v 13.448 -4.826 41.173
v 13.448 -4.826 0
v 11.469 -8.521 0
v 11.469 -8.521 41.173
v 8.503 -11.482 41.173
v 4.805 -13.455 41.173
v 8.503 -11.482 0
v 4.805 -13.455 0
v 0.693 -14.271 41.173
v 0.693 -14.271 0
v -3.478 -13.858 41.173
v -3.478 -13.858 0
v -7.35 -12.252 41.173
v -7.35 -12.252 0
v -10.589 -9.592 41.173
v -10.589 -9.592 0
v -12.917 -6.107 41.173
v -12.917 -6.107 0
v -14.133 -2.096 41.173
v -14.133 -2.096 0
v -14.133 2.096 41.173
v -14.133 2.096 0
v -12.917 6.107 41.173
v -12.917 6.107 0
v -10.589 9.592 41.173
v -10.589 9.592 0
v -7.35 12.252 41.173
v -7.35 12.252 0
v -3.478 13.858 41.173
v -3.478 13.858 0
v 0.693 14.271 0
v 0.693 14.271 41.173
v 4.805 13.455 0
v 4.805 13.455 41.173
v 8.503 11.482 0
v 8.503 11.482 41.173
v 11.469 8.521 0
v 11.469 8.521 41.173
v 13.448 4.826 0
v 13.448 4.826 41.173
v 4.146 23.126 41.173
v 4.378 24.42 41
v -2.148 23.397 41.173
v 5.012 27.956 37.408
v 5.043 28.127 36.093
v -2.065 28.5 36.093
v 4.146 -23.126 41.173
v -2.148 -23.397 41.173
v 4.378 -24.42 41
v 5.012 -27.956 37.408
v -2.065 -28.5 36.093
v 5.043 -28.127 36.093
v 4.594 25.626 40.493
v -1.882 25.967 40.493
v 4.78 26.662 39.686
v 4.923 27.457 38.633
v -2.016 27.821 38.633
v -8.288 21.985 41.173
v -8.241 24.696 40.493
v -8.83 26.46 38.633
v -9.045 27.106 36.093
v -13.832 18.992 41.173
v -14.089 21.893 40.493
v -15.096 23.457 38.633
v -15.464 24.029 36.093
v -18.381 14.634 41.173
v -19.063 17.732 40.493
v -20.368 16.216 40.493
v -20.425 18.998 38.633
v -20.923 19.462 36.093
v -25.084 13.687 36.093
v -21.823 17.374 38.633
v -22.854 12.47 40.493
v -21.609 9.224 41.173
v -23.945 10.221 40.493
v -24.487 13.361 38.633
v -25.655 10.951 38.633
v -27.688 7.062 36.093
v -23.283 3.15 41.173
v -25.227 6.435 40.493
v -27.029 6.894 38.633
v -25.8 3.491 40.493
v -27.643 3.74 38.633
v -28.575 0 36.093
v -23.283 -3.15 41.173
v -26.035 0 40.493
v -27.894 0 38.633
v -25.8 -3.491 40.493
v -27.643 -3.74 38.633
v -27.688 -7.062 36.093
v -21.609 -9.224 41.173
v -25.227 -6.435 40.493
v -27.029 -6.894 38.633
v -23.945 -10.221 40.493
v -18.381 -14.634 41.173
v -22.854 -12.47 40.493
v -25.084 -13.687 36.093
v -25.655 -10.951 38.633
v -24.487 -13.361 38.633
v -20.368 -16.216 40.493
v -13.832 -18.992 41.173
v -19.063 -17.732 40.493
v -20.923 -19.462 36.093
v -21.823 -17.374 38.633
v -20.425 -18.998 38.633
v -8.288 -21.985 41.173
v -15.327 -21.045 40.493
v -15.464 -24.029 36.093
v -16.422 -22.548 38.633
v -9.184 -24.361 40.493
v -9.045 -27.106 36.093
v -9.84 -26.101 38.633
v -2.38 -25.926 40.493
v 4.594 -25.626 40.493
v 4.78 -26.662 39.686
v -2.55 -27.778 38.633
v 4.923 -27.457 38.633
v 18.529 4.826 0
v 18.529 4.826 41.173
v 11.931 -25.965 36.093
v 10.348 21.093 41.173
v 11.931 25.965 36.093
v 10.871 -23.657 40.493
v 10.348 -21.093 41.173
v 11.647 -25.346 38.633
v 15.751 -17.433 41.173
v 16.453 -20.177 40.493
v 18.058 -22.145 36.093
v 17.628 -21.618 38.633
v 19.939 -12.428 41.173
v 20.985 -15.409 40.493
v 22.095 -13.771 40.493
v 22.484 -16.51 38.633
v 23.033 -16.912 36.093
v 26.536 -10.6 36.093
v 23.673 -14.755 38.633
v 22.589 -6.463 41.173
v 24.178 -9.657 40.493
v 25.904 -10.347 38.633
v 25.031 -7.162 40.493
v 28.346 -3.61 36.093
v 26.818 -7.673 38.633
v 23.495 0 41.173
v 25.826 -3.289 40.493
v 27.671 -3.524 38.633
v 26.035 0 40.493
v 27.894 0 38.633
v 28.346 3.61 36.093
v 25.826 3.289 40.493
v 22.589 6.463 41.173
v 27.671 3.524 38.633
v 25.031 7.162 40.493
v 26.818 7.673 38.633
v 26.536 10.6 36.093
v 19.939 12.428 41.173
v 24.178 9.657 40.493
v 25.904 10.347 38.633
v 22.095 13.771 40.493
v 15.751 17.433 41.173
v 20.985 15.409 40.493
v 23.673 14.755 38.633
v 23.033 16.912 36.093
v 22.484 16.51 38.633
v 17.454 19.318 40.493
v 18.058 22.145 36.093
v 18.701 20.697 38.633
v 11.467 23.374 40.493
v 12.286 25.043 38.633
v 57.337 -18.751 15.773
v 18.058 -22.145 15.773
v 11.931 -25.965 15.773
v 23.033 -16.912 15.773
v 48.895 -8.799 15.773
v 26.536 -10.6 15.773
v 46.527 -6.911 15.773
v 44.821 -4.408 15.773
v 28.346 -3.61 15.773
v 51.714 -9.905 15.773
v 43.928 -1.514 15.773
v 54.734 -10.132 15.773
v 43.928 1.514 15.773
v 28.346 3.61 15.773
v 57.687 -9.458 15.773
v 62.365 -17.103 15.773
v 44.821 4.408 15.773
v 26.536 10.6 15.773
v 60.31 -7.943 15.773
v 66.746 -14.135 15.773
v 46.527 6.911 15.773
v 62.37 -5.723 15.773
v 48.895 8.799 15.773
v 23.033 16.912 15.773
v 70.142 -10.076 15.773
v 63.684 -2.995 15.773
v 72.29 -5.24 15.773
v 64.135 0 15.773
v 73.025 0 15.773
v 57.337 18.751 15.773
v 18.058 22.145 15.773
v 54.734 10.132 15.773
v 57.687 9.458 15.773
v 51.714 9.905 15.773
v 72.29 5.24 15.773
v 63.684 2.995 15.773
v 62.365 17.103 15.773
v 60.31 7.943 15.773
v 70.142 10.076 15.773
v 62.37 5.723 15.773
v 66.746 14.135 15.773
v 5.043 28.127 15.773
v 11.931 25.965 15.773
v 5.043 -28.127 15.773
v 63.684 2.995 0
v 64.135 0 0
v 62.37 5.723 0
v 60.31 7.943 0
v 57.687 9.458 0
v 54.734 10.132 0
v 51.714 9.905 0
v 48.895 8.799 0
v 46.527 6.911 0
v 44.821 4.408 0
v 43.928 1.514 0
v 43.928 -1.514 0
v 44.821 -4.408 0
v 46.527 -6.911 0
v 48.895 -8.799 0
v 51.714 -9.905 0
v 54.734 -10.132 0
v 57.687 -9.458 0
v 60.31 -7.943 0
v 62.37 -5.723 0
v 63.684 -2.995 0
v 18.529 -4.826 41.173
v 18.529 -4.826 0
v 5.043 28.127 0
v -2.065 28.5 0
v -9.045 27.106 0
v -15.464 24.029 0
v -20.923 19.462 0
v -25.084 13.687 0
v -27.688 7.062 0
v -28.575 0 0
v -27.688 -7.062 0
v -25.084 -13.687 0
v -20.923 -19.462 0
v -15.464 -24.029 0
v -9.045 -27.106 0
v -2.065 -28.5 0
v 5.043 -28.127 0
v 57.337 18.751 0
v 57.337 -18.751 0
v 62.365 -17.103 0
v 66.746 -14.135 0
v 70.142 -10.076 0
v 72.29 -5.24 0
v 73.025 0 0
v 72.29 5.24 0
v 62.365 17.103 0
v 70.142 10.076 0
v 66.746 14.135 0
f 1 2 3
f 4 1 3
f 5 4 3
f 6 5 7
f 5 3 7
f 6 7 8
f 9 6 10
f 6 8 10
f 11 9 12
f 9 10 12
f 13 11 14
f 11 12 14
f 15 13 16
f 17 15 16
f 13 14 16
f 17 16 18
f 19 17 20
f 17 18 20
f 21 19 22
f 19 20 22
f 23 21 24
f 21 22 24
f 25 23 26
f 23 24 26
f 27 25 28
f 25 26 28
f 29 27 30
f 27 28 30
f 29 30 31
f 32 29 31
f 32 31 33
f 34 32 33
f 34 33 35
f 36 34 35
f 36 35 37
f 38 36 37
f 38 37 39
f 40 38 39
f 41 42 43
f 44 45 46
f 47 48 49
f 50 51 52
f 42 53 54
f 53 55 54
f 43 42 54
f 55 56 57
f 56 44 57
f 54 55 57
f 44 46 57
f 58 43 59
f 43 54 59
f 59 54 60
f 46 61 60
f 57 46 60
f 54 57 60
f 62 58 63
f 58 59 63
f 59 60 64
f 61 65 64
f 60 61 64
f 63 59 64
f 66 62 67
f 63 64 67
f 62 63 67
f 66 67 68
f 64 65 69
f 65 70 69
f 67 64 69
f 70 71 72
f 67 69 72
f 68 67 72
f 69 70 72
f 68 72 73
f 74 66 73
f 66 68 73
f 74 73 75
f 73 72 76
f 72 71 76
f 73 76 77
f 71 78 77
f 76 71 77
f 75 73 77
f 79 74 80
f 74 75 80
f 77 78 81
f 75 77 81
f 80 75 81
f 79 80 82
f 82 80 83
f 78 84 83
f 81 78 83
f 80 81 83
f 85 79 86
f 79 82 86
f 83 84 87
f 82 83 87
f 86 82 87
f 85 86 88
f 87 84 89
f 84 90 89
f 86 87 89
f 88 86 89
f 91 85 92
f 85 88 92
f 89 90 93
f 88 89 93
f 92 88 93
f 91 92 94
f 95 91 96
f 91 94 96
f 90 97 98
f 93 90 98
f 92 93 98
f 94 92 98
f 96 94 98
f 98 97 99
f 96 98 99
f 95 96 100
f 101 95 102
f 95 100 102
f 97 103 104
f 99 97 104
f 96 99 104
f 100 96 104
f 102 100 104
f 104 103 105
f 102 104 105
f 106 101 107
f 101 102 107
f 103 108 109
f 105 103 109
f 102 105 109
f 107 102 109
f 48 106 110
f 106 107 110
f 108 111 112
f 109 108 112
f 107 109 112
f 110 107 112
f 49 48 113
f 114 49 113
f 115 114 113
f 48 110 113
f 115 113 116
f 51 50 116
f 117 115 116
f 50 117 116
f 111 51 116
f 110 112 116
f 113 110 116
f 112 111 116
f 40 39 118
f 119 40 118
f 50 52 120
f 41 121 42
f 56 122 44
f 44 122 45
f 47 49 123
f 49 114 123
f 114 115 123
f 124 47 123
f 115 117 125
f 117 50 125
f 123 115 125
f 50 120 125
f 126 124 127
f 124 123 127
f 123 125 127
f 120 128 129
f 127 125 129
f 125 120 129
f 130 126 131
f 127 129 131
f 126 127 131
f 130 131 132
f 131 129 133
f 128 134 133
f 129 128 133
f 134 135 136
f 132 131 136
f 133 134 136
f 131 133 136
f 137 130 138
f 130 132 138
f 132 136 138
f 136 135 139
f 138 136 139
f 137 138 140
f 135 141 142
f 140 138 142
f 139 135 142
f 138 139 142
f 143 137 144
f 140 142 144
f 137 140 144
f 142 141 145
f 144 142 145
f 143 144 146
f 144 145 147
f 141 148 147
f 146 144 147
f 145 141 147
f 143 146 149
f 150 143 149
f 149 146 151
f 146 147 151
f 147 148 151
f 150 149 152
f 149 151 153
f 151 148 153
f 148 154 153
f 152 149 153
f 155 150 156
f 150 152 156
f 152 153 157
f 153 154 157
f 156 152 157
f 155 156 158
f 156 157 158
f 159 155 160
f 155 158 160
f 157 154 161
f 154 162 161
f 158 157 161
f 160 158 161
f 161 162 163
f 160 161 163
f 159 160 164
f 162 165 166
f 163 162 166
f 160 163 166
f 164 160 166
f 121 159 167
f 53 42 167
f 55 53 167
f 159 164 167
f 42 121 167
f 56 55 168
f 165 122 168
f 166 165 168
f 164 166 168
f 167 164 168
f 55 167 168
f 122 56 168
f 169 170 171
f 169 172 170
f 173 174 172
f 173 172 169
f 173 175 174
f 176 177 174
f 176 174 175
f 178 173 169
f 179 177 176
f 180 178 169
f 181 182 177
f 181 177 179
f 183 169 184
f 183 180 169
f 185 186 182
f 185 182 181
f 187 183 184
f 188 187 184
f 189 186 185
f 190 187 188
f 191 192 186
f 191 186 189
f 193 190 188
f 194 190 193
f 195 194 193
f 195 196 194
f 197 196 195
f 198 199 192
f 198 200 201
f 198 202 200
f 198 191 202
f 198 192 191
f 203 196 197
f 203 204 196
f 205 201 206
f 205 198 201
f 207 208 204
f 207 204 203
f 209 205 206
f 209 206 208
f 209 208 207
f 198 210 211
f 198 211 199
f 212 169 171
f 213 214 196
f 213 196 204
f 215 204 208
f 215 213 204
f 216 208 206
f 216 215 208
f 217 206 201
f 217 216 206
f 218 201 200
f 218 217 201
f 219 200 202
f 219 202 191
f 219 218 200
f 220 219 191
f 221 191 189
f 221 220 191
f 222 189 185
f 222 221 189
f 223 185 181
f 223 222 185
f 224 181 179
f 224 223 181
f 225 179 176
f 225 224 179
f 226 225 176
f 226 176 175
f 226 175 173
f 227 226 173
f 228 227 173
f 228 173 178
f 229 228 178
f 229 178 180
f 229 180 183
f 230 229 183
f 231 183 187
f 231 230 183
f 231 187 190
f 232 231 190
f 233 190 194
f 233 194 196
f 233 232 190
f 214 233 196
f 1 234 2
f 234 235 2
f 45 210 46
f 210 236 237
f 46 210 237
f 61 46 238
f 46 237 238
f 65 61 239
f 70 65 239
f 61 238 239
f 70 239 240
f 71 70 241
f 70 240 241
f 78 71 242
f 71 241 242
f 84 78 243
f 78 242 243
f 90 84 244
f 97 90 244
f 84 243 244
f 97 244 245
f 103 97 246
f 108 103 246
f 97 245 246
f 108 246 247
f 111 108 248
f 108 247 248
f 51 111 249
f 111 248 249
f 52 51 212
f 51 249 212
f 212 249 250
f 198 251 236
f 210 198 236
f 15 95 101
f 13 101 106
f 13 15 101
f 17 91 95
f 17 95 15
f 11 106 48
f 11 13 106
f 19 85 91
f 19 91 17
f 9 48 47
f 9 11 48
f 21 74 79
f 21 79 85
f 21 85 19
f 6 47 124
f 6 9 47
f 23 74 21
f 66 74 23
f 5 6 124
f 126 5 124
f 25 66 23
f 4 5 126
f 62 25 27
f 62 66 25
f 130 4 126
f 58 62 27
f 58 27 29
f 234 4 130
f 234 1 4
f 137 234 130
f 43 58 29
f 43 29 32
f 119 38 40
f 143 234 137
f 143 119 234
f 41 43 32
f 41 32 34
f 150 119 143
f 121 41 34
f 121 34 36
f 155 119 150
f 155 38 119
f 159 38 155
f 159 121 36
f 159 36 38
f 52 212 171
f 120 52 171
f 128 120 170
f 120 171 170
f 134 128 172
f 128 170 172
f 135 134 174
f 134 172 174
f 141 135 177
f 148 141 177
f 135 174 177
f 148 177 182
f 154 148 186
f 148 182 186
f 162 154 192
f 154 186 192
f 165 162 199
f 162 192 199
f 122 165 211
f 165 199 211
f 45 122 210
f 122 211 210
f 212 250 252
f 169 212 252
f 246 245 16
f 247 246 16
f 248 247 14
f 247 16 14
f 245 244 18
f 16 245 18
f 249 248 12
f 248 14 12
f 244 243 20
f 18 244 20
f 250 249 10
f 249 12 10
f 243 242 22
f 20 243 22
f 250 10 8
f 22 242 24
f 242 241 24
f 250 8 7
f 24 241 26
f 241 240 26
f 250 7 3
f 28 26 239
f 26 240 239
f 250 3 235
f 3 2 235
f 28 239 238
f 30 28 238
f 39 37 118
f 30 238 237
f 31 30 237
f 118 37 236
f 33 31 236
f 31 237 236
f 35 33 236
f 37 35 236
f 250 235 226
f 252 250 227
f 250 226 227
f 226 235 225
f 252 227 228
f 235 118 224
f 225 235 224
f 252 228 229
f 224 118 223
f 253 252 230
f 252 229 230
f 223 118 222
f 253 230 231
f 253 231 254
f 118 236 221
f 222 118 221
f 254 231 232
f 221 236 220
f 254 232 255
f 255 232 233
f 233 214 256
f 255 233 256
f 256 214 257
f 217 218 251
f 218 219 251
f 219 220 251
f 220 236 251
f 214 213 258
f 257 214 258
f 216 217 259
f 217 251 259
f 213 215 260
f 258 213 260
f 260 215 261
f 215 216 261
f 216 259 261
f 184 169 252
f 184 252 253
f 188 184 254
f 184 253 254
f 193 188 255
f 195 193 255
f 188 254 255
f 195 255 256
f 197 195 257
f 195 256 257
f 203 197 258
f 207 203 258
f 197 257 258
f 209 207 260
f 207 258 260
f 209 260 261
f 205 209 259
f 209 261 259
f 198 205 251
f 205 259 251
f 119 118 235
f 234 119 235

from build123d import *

# Parameters (mm, degrees)
F0_R     = 10.16
F1_DEPTH = 15.7734
F3_DEPTH = 25.4
F4_R     = 5.08


with BuildPart() as f1:
    # F0 (on Top) → F1 (new body)
    with BuildSketch(Plane.XY):
        with BuildLine():
            ThreePointArc((5.0426470588, -28.1265414802), (21.9160245563, -18.3362616868), (28.575, 0))
            ThreePointArc((28.575, 0), (21.9160245563, 18.3362616868), (5.0426470588, 28.1265414802))
            ThreePointArc((5.0426470588, 28.1265414802), (-28.575, 0), (5.0426470588, -28.1265414802))
        make_face()
        with BuildLine():
            ThreePointArc((13.4477648793, -4.826), (-14.2875, 0), (13.4477648793, 4.826))
            Line((13.4477648793, 4.826), (18.5293, 4.826))
            Line((18.5293, 4.826), (18.5293, -4.826))
            Line((18.5293, -4.826), (13.4477648793, -4.826))
        make_face(mode=Mode.SUBTRACT)
        with BuildLine():
            ThreePointArc((5.0426470588, 28.1265414802), (21.9160245563, 18.3362616868), (28.575, 0))
            ThreePointArc((28.575, 0), (21.9160245563, -18.3362616868), (5.0426470588, -28.1265414802))
            Line((5.0426470588, -28.1265414802), (57.3367647059, -18.7510276535))
            ThreePointArc((57.3367647059, -18.7510276535), (73.025, 0), (57.3367647059, 18.7510276535))
            Line((57.3367647059, 18.7510276535), (5.0426470588, 28.1265414802))
        make_face()
        with Locations((53.975, 0)):
            Circle(F0_R, mode=Mode.SUBTRACT)
    extrude(amount=F1_DEPTH)

    # F2 (on face) → F3 (join)
    with BuildSketch(Plane.XY.offset(15.7734)):
        with BuildLine():
            ThreePointArc((5.0426470588, -28.1265414802), (21.9160245563, -18.3362616868), (28.575, 0))
            ThreePointArc((28.575, 0), (21.9160245563, 18.3362616868), (5.0426470588, 28.1265414802))
            ThreePointArc((5.0426470588, 28.1265414802), (-28.575, 0), (5.0426470588, -28.1265414802))
        make_face()
        with BuildLine():
            Line((18.5293, -4.826), (13.4477648793, -4.826))
            ThreePointArc((13.4477648793, -4.826), (-14.2875, 0), (13.4477648793, 4.826))
            Line((13.4477648793, 4.826), (18.5293, 4.826))
            Line((18.5293, 4.826), (18.5293, -4.826))
        make_face(mode=Mode.SUBTRACT)
    extrude(amount=F3_DEPTH)

    # F4
    f4_edges = [f1.edges().sort_by_distance(p)[0] for p in [
        (-5.042647, 28.126541, 41.1734),
    ]]
    fillet(f4_edges, radius=F4_R)


solid = f1.part
